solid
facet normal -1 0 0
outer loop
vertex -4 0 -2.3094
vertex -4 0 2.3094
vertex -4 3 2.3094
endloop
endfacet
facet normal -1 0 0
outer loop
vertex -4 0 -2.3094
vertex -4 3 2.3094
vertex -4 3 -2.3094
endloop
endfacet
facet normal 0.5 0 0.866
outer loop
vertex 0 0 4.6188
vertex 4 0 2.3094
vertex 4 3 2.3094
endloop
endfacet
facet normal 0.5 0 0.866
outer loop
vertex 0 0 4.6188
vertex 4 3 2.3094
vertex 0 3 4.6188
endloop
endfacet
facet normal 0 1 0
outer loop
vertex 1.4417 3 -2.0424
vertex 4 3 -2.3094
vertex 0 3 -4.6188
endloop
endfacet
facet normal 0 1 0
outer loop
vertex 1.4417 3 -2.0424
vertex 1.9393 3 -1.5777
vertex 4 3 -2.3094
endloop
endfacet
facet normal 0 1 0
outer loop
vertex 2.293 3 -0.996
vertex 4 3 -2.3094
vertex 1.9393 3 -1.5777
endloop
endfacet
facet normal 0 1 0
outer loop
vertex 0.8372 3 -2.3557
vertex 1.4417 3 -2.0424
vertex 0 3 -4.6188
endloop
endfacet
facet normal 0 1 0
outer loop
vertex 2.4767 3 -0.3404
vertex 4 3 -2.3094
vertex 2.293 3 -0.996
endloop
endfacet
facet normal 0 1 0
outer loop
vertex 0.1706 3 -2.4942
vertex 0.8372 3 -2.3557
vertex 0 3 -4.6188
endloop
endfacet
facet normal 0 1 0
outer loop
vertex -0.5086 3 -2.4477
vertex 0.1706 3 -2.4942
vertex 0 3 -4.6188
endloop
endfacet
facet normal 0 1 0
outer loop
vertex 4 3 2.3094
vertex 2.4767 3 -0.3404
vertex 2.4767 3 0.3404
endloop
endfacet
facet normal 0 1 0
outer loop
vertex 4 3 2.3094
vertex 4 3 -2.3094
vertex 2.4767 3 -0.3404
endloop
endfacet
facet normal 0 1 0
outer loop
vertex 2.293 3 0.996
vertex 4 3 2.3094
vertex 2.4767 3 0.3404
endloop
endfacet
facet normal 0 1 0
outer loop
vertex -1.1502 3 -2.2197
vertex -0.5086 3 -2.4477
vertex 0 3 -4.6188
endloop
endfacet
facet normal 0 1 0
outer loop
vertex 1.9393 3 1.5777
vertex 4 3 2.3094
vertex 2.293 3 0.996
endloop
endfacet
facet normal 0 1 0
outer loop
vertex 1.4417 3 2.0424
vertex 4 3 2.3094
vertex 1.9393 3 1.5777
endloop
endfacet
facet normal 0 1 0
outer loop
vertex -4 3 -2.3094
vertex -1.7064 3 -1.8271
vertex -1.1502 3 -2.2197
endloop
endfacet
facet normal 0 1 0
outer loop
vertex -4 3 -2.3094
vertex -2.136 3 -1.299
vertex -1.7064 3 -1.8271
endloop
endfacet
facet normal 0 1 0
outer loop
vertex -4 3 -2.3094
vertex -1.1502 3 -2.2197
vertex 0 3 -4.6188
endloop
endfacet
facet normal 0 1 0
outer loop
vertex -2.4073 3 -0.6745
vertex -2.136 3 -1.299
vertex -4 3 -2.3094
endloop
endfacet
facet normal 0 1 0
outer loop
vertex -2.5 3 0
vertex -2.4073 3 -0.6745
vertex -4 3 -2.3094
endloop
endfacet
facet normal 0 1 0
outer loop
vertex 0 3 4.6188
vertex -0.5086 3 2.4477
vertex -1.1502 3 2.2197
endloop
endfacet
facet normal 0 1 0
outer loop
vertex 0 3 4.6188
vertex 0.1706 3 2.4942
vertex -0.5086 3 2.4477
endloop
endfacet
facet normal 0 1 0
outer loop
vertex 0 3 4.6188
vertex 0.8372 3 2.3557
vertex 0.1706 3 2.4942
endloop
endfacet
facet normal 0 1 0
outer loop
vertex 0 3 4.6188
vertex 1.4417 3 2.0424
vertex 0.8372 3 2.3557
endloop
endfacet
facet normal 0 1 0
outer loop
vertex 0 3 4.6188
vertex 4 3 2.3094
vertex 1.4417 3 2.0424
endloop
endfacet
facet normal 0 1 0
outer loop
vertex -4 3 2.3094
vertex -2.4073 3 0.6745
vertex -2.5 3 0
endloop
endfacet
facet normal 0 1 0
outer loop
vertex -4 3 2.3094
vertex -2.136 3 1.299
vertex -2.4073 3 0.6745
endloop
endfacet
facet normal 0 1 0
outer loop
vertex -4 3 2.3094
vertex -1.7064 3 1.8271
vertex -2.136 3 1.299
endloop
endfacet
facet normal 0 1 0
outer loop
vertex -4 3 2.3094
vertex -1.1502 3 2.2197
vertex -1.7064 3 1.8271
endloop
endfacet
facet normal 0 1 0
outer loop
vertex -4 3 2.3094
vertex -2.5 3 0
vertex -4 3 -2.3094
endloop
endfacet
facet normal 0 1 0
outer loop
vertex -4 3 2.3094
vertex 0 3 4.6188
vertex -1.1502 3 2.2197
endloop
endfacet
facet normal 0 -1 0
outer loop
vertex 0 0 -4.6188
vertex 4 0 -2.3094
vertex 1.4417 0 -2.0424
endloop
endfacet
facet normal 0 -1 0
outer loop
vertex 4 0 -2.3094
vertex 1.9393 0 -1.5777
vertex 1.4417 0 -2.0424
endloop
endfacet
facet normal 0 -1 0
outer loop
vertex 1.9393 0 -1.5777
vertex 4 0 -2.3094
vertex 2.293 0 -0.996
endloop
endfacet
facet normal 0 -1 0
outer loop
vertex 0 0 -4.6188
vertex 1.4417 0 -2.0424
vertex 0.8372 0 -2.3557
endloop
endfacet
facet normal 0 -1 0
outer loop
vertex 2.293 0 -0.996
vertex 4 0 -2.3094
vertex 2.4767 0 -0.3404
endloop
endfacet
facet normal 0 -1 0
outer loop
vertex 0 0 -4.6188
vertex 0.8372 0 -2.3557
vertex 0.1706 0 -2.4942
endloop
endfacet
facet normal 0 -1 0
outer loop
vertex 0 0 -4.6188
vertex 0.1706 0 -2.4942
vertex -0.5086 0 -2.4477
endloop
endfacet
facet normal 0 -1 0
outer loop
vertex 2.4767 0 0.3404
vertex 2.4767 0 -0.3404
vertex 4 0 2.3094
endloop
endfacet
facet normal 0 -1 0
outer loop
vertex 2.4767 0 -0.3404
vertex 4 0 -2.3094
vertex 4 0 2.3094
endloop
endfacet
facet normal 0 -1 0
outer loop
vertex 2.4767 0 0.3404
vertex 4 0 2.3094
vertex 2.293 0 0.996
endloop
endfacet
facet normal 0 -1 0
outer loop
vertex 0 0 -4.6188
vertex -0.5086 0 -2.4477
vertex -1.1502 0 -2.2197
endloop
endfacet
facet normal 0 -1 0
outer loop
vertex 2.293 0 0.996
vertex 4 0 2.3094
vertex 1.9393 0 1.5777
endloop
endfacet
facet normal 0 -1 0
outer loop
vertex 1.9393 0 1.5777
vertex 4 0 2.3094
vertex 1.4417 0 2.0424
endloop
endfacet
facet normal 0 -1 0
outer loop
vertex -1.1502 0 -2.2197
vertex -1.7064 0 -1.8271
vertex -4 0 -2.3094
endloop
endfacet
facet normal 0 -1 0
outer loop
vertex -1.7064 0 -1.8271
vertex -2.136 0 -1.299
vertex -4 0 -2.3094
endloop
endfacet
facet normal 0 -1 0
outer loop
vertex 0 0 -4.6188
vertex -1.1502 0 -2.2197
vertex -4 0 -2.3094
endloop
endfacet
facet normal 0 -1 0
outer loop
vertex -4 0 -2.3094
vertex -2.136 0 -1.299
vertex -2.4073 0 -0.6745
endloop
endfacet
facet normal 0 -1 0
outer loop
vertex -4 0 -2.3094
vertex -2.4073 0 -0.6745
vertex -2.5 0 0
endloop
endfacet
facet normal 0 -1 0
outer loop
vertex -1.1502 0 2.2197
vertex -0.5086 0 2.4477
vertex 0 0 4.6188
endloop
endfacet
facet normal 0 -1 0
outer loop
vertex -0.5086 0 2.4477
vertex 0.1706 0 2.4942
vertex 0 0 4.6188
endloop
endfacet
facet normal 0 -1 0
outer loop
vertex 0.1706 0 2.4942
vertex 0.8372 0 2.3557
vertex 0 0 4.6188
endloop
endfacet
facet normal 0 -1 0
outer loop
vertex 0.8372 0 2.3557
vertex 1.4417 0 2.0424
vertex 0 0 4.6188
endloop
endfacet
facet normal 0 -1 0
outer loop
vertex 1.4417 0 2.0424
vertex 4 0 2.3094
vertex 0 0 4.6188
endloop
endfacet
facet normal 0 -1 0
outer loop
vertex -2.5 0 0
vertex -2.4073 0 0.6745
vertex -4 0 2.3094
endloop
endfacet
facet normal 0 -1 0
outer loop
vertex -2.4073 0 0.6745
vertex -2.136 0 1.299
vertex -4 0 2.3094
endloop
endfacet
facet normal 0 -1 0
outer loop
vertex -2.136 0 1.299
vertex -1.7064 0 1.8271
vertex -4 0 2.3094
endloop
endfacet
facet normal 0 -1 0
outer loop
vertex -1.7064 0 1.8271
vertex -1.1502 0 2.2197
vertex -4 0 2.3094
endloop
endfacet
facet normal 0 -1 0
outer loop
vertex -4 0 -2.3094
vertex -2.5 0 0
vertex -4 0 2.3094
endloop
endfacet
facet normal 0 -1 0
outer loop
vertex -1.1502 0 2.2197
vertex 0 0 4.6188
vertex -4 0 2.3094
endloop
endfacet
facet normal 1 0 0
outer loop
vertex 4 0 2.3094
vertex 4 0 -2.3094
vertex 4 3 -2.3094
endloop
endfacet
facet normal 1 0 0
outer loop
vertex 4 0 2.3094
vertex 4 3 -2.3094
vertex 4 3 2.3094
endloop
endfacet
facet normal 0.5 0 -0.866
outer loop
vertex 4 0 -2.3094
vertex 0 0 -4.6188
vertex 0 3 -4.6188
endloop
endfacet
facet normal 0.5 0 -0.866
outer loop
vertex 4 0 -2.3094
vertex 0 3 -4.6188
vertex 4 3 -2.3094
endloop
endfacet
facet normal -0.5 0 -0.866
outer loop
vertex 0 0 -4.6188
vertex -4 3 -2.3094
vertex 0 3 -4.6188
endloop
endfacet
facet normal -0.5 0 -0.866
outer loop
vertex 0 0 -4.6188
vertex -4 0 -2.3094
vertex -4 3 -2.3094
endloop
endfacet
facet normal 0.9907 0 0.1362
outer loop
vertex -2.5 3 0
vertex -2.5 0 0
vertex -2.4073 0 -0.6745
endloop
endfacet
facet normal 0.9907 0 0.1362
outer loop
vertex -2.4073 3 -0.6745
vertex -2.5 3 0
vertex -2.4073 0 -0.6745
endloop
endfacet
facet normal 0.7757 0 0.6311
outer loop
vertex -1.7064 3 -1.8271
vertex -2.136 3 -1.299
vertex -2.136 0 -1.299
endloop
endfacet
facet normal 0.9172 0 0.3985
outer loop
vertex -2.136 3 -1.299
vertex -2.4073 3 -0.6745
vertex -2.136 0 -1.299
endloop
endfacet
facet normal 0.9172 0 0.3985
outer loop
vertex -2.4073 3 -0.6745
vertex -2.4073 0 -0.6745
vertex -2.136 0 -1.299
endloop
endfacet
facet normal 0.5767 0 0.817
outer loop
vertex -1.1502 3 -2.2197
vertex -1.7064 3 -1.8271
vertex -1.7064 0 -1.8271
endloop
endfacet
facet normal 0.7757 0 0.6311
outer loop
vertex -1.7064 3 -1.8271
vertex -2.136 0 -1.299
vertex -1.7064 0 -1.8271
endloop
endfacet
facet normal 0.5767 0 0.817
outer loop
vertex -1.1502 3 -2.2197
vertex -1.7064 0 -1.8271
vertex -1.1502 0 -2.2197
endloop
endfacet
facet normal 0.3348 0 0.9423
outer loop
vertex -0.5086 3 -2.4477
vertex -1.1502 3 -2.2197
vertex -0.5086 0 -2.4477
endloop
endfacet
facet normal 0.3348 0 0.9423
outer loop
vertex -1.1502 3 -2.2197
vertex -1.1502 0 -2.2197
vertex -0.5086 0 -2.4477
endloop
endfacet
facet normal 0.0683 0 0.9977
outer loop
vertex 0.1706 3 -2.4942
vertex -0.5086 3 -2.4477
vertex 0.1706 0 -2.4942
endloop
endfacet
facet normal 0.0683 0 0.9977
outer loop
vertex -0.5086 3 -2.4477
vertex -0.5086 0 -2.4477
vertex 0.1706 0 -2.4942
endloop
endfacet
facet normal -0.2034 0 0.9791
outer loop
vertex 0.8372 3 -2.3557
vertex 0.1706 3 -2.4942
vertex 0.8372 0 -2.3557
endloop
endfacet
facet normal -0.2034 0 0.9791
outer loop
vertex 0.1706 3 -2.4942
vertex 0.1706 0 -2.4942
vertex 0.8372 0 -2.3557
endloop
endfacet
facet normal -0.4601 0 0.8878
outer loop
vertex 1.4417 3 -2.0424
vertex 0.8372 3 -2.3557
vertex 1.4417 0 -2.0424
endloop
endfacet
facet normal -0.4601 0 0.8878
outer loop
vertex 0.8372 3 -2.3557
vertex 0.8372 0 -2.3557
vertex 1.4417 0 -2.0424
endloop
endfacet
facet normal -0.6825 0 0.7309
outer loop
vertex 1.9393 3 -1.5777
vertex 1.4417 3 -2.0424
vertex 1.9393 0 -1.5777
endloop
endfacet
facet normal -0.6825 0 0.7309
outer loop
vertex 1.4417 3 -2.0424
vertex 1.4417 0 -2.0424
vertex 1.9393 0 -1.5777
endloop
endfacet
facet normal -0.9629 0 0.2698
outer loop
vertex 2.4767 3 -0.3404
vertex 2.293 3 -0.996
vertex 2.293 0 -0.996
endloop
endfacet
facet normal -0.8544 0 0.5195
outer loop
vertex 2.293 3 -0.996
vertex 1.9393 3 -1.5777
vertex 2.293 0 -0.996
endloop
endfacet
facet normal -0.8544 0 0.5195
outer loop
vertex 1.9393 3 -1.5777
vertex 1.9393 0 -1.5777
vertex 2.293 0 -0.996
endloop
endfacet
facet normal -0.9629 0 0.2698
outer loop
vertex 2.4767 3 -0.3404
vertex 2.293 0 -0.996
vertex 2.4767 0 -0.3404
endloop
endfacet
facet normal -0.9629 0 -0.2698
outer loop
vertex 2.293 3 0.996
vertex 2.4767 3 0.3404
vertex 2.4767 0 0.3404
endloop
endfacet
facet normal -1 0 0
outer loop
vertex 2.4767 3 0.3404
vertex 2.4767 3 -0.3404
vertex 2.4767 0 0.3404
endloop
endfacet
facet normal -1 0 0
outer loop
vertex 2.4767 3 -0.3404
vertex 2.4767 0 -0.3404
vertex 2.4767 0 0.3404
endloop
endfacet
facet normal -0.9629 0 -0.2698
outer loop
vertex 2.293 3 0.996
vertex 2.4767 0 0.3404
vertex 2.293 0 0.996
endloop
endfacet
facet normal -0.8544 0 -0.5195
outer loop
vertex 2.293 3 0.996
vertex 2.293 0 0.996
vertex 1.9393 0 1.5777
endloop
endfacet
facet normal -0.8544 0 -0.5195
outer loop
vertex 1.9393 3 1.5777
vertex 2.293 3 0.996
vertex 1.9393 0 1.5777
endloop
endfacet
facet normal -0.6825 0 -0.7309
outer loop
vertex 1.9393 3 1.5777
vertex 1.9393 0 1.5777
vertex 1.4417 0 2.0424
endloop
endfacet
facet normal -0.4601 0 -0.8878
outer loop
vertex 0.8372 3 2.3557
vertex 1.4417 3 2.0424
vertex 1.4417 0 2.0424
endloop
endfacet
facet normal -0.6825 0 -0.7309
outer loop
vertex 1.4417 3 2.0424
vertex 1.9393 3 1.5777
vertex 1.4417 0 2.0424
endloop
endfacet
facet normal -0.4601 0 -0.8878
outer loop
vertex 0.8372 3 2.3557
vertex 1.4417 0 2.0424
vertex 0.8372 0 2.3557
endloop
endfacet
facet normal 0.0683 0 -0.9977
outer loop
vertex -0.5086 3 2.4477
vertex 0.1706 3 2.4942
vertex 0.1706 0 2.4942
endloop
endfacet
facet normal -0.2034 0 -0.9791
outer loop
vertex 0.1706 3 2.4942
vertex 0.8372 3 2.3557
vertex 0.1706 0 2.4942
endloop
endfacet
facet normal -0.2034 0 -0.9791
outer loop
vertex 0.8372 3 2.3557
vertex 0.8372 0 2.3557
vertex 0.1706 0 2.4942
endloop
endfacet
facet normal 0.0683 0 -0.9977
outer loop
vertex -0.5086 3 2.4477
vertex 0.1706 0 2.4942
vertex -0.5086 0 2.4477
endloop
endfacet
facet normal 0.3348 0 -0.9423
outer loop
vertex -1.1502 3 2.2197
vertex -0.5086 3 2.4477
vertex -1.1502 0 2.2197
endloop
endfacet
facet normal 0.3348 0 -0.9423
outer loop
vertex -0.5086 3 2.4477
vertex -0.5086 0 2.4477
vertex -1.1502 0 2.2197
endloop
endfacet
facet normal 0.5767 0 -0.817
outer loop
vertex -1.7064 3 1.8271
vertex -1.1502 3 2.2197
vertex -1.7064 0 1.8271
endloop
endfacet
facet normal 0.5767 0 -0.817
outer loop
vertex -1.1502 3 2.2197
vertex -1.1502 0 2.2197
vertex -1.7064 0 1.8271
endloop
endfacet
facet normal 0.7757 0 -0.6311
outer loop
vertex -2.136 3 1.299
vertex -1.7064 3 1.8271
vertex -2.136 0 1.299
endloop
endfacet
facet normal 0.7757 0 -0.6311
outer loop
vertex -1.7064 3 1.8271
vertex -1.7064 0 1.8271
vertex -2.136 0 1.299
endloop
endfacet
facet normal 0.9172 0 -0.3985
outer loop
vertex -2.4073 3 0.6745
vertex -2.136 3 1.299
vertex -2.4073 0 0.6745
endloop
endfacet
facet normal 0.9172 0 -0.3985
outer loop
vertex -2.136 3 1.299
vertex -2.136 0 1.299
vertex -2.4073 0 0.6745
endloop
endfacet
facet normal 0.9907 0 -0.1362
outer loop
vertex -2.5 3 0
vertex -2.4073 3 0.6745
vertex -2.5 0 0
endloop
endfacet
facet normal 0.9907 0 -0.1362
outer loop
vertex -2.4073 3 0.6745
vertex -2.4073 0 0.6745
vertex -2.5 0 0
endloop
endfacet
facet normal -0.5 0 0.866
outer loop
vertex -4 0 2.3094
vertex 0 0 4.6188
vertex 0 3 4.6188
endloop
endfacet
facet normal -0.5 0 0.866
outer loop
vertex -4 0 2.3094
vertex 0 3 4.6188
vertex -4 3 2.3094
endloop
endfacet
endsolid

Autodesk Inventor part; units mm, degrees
ref_plane "YZ Plane" through (0, 0, 0) normal (1, 0, 0) x (0, 1, 0)
ref_plane "XZ Plane" through (0, 0, 0) normal (0, 1, 0) x (-1, 0, 0)
ref_plane "XY Plane" through (0, 0, 0) normal (0, 0, 1) x (1, 0, 0)
sketch "Sketch1" plane through (0, 0, 0) normal (0, 1, 0) x (-1, 0, 0)
  line L0 (0, -4.6188) -> (-4, -2.3094)
  line L1 (-4, -2.3094) -> (-4, 2.3094)
  line L2 (-4, 2.3094) -> (0, 4.6188)
  line L3 (0, 4.6188) -> (4, 2.3094)
  line L4 (4, 2.3094) -> (4, -2.3094)
  line L5 (4, -2.3094) -> (0, -4.6188)
  circle A0 centre (0, 0) radius 2.5
  dimension "d0" = 8
  dimension "d1" = 5
extrude "Extrusion1" add sketch "Sketch1" along normal blind 3
thread "Thread1" size "M5x0.8" class "6H" standard "ANSI Metric M Profile" full length
properties part number "nut rod"
